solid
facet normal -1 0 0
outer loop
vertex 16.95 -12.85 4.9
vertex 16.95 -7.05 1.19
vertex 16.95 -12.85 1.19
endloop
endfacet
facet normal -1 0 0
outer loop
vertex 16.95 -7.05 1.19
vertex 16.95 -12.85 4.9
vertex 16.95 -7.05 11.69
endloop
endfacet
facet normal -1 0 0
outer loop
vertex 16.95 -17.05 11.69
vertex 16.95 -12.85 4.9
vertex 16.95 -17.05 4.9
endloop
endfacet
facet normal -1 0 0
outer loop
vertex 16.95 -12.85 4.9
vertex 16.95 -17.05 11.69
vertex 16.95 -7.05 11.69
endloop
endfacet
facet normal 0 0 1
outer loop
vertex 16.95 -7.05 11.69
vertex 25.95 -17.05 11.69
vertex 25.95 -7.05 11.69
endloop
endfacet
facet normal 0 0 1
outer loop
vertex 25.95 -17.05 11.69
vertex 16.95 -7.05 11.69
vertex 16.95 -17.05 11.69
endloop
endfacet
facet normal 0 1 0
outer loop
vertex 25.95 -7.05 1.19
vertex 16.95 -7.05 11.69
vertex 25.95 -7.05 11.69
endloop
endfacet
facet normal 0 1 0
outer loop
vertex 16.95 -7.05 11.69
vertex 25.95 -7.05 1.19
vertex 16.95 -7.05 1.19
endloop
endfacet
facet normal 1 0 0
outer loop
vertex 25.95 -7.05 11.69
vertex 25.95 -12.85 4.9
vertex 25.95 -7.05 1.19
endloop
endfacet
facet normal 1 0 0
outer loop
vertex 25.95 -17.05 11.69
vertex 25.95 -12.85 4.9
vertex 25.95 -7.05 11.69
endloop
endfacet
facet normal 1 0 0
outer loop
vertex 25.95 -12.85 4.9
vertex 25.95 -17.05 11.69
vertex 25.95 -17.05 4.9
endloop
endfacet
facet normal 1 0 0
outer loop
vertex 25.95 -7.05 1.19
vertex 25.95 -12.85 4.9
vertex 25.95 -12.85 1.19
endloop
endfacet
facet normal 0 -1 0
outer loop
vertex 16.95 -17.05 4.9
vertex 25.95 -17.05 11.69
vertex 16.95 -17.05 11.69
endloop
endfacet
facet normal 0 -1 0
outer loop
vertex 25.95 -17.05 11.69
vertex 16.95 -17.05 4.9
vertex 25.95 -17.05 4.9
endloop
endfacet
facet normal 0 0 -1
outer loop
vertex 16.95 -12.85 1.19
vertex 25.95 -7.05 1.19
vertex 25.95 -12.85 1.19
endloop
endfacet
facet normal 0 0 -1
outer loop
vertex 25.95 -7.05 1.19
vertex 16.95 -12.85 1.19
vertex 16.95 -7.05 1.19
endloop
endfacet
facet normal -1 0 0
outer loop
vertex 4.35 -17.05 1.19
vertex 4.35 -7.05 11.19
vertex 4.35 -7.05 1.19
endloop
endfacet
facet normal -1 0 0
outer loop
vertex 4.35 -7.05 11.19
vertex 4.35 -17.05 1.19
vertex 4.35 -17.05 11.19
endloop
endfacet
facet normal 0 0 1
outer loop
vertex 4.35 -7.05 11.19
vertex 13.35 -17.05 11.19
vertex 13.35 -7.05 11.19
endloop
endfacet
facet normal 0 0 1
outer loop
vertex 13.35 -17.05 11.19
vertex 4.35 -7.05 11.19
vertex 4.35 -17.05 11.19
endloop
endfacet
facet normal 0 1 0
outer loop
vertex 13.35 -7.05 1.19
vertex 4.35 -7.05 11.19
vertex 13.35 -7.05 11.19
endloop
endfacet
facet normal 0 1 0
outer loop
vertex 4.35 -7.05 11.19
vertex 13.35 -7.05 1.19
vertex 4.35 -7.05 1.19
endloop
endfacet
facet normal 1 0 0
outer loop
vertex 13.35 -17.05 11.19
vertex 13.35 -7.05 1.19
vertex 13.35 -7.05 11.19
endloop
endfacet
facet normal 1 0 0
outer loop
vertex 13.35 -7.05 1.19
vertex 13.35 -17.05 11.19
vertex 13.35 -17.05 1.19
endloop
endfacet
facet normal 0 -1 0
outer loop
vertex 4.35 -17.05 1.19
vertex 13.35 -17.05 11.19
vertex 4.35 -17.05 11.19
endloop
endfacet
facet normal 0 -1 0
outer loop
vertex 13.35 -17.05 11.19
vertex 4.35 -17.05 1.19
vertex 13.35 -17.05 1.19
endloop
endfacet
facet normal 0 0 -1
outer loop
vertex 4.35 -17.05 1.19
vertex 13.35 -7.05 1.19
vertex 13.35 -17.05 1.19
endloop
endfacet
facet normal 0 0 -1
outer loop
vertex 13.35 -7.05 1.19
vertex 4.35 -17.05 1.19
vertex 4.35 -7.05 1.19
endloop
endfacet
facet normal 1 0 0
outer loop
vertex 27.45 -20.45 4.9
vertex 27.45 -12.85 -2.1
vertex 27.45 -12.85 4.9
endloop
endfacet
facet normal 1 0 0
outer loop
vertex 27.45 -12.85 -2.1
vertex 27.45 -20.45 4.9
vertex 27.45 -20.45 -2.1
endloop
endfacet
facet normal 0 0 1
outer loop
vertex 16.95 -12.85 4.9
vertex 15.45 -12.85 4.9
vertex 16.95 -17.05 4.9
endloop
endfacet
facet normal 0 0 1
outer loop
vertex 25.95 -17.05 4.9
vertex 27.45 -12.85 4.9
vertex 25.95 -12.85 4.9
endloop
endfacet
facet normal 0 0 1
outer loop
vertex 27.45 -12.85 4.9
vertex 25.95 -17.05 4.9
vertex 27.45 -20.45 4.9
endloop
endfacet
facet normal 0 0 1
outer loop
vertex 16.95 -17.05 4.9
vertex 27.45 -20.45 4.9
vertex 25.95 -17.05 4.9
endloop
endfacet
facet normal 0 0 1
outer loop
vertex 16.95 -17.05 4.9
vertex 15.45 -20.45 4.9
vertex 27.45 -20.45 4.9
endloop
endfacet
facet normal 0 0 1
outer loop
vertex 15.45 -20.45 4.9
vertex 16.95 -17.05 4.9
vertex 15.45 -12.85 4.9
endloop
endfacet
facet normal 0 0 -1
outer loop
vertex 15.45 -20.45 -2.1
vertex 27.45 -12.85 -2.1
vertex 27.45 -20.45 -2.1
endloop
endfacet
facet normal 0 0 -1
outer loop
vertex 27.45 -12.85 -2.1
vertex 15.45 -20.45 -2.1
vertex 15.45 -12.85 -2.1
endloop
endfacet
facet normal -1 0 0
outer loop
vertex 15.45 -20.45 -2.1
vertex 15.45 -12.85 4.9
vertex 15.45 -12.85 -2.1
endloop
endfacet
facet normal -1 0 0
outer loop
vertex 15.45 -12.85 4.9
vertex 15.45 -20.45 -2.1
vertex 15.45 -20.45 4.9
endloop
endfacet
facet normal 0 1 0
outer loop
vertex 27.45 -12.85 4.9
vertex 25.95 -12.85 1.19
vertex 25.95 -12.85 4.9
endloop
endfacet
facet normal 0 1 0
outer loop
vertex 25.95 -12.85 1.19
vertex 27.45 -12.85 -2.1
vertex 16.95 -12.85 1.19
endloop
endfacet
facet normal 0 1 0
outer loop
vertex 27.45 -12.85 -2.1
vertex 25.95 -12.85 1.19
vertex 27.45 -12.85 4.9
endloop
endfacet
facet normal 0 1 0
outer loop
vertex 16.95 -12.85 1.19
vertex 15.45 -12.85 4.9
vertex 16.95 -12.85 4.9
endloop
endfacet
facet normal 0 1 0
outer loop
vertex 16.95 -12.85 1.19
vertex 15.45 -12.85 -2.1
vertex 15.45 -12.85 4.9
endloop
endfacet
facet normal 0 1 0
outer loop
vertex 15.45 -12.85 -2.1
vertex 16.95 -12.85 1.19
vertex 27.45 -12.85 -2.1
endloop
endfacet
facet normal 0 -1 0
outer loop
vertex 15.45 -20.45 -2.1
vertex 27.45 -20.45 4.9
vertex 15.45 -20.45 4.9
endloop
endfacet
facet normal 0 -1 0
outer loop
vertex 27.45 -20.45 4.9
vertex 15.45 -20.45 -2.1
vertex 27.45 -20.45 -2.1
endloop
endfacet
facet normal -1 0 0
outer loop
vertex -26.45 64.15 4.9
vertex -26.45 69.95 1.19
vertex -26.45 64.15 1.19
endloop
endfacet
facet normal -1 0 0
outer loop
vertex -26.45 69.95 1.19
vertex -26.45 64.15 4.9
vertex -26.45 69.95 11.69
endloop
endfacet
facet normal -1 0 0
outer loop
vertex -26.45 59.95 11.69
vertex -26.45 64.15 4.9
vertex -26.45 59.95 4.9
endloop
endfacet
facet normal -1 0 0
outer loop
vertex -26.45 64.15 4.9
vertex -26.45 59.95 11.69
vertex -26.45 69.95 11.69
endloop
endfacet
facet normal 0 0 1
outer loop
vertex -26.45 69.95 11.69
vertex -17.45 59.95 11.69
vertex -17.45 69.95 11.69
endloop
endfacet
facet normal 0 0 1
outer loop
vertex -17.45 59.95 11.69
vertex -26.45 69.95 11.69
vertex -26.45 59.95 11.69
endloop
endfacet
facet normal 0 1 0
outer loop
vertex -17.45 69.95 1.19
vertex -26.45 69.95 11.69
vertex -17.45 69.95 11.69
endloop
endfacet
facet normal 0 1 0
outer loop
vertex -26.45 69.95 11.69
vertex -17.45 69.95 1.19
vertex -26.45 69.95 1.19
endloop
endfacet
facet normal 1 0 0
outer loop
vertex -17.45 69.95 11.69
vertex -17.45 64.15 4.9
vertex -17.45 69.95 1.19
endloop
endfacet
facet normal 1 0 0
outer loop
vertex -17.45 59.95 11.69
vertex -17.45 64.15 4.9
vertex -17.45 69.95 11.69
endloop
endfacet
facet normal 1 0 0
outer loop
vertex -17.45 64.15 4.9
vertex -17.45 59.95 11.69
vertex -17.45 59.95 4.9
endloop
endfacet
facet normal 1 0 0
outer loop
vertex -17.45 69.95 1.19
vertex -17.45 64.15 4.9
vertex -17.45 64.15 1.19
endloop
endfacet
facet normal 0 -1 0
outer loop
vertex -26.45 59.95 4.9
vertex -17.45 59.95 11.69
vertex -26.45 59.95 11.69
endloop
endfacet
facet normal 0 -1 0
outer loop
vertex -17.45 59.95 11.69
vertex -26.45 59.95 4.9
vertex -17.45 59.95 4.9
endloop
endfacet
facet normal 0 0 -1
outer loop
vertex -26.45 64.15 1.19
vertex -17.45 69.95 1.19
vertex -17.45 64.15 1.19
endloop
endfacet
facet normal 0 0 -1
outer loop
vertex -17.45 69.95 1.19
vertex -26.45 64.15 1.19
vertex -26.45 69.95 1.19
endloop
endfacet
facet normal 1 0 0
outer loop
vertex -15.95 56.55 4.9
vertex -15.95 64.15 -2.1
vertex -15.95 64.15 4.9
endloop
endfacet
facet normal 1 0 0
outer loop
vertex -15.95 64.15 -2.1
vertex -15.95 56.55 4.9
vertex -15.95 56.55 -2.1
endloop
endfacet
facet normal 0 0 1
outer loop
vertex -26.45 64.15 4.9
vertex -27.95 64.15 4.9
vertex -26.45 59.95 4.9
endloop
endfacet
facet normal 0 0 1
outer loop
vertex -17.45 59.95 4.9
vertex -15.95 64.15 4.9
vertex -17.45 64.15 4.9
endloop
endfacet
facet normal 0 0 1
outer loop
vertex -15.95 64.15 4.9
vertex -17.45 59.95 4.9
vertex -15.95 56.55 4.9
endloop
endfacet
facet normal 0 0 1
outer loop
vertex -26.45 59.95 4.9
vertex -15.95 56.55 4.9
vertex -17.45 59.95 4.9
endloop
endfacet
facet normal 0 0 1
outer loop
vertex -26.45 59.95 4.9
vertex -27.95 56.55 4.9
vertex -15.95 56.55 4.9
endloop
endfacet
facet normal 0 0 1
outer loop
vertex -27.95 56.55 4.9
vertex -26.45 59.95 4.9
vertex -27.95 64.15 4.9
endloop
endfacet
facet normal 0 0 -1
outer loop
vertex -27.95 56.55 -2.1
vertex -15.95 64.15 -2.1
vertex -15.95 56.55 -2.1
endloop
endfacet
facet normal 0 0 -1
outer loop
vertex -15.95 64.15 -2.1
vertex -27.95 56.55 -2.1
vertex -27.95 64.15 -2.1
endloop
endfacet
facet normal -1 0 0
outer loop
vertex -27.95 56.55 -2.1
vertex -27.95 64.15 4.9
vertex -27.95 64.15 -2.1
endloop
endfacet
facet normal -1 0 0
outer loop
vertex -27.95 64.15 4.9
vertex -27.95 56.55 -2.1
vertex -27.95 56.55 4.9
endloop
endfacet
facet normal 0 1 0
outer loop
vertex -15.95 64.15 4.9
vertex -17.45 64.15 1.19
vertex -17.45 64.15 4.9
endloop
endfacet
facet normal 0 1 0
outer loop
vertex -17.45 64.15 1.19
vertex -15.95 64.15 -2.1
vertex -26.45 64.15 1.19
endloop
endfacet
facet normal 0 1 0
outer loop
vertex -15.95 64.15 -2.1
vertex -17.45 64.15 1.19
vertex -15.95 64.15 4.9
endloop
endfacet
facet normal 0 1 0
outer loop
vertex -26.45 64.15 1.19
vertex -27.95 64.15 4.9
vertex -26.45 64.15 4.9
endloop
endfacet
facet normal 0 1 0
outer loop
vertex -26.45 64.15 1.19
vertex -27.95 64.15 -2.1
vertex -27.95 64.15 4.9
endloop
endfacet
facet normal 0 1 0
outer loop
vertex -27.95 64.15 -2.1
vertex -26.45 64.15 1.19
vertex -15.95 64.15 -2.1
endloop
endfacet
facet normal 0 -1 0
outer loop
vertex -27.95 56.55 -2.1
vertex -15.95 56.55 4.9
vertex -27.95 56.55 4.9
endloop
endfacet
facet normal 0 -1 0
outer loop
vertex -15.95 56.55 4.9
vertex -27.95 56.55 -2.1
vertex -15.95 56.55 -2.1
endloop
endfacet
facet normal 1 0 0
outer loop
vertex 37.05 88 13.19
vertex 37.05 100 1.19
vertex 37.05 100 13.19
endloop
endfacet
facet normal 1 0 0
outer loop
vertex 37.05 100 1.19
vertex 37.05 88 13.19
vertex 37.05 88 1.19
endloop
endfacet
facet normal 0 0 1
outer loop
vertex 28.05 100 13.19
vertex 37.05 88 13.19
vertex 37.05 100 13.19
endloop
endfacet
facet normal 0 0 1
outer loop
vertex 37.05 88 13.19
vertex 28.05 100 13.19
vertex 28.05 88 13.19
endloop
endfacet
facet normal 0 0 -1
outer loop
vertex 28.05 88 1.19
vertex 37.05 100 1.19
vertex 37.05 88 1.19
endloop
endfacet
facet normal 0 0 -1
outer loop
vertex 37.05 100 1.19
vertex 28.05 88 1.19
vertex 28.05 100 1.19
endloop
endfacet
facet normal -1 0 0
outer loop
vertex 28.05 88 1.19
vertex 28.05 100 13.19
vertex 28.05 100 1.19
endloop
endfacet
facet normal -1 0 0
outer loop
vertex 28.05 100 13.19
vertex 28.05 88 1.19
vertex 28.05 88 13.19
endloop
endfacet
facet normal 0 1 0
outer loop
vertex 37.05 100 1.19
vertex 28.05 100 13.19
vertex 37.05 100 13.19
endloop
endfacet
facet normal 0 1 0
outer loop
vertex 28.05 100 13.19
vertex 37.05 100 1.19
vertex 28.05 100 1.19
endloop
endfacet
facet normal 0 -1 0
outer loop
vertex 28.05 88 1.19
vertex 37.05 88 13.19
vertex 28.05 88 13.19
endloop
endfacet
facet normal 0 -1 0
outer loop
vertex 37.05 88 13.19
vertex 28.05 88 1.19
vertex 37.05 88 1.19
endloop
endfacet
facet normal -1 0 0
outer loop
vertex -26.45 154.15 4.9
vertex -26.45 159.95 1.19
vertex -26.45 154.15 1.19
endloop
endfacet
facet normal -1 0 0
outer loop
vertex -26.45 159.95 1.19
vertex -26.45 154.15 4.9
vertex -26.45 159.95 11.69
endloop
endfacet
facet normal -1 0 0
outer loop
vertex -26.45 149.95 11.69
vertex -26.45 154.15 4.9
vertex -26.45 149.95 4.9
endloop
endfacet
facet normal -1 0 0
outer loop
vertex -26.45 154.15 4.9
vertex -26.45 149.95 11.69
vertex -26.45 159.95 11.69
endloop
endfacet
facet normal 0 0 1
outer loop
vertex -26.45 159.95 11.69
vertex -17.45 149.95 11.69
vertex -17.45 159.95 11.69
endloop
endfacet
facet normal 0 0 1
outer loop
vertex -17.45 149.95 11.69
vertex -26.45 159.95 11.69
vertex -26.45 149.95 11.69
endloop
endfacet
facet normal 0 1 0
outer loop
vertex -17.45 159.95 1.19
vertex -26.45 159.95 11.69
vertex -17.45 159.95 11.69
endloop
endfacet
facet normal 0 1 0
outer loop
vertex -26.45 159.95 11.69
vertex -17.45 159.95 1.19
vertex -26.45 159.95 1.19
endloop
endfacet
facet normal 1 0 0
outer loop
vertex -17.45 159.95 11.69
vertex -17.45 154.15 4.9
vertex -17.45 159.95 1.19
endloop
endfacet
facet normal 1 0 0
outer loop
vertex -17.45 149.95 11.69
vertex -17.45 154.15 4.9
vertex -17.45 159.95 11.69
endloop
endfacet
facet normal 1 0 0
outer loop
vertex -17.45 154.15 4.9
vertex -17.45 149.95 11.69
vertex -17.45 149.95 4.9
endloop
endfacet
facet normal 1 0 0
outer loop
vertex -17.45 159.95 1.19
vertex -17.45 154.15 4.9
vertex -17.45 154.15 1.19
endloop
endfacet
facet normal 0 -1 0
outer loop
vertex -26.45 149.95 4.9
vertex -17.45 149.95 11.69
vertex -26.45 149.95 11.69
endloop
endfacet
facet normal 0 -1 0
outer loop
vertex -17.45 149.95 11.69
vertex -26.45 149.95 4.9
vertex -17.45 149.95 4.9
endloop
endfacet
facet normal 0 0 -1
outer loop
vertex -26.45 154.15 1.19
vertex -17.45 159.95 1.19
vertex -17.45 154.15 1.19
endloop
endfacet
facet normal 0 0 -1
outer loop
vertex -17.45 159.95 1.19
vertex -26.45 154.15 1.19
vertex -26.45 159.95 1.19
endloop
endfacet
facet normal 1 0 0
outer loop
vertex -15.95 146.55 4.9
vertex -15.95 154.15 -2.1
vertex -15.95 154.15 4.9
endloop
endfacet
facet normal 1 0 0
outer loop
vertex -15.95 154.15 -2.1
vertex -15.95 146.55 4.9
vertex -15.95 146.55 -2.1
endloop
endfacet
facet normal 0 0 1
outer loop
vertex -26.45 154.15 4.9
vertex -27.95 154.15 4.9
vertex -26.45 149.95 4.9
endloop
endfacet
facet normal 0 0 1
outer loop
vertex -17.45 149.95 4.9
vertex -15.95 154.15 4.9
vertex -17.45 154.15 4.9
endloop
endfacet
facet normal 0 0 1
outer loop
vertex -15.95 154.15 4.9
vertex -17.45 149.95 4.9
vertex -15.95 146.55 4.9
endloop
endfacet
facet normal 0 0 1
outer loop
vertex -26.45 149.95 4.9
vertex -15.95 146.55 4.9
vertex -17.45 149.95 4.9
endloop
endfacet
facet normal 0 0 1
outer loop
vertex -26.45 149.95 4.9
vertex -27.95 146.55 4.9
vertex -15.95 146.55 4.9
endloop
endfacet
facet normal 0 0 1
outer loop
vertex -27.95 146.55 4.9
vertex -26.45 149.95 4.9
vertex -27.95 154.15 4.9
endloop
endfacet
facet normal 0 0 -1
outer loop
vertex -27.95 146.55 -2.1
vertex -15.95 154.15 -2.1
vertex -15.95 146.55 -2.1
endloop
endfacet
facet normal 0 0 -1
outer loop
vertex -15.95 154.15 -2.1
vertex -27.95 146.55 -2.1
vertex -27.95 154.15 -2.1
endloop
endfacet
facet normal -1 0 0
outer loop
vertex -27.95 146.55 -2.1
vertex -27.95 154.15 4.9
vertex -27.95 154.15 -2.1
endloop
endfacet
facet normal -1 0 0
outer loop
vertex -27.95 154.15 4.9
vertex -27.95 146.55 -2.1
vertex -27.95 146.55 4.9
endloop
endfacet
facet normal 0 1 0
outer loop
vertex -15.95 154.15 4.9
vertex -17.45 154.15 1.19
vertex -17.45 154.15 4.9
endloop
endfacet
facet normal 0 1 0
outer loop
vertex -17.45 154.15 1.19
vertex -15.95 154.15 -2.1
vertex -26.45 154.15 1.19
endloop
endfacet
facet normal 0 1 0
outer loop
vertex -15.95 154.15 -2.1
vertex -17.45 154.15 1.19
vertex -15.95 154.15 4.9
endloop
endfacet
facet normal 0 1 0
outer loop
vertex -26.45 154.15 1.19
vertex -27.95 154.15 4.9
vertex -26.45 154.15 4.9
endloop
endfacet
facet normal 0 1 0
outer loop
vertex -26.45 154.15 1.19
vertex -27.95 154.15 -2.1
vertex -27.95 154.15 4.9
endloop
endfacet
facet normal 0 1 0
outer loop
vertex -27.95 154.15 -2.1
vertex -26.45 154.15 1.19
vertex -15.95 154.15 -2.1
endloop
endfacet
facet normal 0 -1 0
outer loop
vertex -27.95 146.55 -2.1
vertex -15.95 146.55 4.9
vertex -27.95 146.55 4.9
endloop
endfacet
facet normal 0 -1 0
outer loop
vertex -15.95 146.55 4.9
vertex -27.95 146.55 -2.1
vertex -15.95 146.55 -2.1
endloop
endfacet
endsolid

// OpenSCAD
// file: PiDimensions.scad
// Dimensions for raspberry Pis

hole_offset = 3.5;
e = 0.001;

// gap between board and walls (y)
gap = 0.4;

outer_radius = 7;
inner_radius = 1;

// thickness of sides
top_thick = 1.2;
side_thick = 1.2;
hat_height = 17;
sweep_height = 10;

standoff_height = 7;
standoff_radius = 3;

corner_support_radius = 5.5;
corner_support_hole = 3;
corner_space_left = 2 * corner_support_radius;


pin_height = 2;

pin_radius = 1.1;


thickness = 1.2; // mm for board

split = top_thick
    +standoff_height
    +thickness
    +8;


// width
// depth

NAME=0;
WIDTH=1;
DEPTH=2;
HEIGHT=3;
HATS=9;
SPACE_LEFT = 10;
SPACE_RIGHT = 11;

// https://www.raspberrypi.org/documentation/hardware/raspberrypi/mechanical/rpi_MECH_3aplus.pdf

function params_pi3A() = [
  "Pi3A",
  65+.10, /* width */
  56+.10, /* depth */
  12,     /* height of highest point */
  10.6,   /* center of USB for power */
  10.6,   /* center of second USB (if none use same) */
  32.0,   /* hdmi offset */
  17.0,   /* hdmi width */
   8.0,   /* hdmi height */
   1.0,   /* hats */
   6.0,   /* space left */
   6.0,   /* space right */
];

function params_pi3B() = [
  "Pi3B",
  65+.10, /* width */
  56+.10, /* depth */
  12.0,   /* height of highest point */
  10.6,   /* center of USB for power */
  10.6,   /* center of second USB (if none use same) */
  32.0,   /* hdmi offset */
  17.0,   /* hdmi width */
   8.0,   /* hdmi height */
   1.0,   /* hats */
   6.0,   /* space left */
   16.0,  /* space right */
];

function params_piW() = [
  "PiW",
  65+.10, /* width */
  30+.10, /* depth */
  12.0,     /* height of highest point */
  54,     /* center of USB for power */
  41.4,   /* center of second USB (if none use same) */
  12.4,   /* hdmi offset */
  15.0,   /* hdmi width */
   7.0,   /* hdmi height */
   1.0,   /* hats */
   6.0,   /* space left */
   6.0,   /* space right */
];

function examples() = [
  [0, params_piW(), "red"],
  [90, params_pi3A(), "green"],
  [180, params_pi3B(), "blue"]
];

// use in a loop
//for (ex = examples())
//    translate([0,ex[0],0])
//    usb_plus(ex[1]);


// Sweeps a connector up to clear a path for it
module sweep(h=0)
{
   hull()
   {
       children();
       translate([0,0,sweep_height-h])
       children();
   }
}
// main file
// USB Connections on Raspberry Pi
include <PiDimensions.scad>;

micro_usb_height = 3;

module usbs(params) {
    width = params[WIDTH];
    depth = params[DEPTH];
    height = params[HEIGHT];
    usb_offset = params[4];
    second_usb_offset = params[5];

// primary usb power
  translate([
   -width/2+usb_offset,
   -depth/2+3, 
   thickness-.01+micro_usb_height/2])
    sweep(micro_usb_height-0.5)
  cube([
    9,10,
    micro_usb_height],center=true);
    
// secondary usb (PiW)

  translate([-width/2+second_usb_offset,
    -depth/2+3, 
   thickness-.01+micro_usb_height/2])
   sweep(micro_usb_height)
  cube([
    9,10,
    micro_usb_height],center=true);

// hole for plug
  translate([-width/2+usb_offset,
  -side_thick-depth/2-gap,
  thickness+.2])
  cube([12,side_thick+gap+6,7],center=true);
  
  // USB on side for Pi3A
  if (params[NAME]=="Pi3A")
  {
      // carve out an area above and for the side USB
  translate([
   width/2,
   4,  // 4mm north of center line 
   height/2+thickness-.01])
  cube([9,12,height],center=true);
      
      
      
  }
  
}

for (ex = examples())
    color(ex[2])
    translate([0,ex[0],0])
    usbs(ex[1]);
